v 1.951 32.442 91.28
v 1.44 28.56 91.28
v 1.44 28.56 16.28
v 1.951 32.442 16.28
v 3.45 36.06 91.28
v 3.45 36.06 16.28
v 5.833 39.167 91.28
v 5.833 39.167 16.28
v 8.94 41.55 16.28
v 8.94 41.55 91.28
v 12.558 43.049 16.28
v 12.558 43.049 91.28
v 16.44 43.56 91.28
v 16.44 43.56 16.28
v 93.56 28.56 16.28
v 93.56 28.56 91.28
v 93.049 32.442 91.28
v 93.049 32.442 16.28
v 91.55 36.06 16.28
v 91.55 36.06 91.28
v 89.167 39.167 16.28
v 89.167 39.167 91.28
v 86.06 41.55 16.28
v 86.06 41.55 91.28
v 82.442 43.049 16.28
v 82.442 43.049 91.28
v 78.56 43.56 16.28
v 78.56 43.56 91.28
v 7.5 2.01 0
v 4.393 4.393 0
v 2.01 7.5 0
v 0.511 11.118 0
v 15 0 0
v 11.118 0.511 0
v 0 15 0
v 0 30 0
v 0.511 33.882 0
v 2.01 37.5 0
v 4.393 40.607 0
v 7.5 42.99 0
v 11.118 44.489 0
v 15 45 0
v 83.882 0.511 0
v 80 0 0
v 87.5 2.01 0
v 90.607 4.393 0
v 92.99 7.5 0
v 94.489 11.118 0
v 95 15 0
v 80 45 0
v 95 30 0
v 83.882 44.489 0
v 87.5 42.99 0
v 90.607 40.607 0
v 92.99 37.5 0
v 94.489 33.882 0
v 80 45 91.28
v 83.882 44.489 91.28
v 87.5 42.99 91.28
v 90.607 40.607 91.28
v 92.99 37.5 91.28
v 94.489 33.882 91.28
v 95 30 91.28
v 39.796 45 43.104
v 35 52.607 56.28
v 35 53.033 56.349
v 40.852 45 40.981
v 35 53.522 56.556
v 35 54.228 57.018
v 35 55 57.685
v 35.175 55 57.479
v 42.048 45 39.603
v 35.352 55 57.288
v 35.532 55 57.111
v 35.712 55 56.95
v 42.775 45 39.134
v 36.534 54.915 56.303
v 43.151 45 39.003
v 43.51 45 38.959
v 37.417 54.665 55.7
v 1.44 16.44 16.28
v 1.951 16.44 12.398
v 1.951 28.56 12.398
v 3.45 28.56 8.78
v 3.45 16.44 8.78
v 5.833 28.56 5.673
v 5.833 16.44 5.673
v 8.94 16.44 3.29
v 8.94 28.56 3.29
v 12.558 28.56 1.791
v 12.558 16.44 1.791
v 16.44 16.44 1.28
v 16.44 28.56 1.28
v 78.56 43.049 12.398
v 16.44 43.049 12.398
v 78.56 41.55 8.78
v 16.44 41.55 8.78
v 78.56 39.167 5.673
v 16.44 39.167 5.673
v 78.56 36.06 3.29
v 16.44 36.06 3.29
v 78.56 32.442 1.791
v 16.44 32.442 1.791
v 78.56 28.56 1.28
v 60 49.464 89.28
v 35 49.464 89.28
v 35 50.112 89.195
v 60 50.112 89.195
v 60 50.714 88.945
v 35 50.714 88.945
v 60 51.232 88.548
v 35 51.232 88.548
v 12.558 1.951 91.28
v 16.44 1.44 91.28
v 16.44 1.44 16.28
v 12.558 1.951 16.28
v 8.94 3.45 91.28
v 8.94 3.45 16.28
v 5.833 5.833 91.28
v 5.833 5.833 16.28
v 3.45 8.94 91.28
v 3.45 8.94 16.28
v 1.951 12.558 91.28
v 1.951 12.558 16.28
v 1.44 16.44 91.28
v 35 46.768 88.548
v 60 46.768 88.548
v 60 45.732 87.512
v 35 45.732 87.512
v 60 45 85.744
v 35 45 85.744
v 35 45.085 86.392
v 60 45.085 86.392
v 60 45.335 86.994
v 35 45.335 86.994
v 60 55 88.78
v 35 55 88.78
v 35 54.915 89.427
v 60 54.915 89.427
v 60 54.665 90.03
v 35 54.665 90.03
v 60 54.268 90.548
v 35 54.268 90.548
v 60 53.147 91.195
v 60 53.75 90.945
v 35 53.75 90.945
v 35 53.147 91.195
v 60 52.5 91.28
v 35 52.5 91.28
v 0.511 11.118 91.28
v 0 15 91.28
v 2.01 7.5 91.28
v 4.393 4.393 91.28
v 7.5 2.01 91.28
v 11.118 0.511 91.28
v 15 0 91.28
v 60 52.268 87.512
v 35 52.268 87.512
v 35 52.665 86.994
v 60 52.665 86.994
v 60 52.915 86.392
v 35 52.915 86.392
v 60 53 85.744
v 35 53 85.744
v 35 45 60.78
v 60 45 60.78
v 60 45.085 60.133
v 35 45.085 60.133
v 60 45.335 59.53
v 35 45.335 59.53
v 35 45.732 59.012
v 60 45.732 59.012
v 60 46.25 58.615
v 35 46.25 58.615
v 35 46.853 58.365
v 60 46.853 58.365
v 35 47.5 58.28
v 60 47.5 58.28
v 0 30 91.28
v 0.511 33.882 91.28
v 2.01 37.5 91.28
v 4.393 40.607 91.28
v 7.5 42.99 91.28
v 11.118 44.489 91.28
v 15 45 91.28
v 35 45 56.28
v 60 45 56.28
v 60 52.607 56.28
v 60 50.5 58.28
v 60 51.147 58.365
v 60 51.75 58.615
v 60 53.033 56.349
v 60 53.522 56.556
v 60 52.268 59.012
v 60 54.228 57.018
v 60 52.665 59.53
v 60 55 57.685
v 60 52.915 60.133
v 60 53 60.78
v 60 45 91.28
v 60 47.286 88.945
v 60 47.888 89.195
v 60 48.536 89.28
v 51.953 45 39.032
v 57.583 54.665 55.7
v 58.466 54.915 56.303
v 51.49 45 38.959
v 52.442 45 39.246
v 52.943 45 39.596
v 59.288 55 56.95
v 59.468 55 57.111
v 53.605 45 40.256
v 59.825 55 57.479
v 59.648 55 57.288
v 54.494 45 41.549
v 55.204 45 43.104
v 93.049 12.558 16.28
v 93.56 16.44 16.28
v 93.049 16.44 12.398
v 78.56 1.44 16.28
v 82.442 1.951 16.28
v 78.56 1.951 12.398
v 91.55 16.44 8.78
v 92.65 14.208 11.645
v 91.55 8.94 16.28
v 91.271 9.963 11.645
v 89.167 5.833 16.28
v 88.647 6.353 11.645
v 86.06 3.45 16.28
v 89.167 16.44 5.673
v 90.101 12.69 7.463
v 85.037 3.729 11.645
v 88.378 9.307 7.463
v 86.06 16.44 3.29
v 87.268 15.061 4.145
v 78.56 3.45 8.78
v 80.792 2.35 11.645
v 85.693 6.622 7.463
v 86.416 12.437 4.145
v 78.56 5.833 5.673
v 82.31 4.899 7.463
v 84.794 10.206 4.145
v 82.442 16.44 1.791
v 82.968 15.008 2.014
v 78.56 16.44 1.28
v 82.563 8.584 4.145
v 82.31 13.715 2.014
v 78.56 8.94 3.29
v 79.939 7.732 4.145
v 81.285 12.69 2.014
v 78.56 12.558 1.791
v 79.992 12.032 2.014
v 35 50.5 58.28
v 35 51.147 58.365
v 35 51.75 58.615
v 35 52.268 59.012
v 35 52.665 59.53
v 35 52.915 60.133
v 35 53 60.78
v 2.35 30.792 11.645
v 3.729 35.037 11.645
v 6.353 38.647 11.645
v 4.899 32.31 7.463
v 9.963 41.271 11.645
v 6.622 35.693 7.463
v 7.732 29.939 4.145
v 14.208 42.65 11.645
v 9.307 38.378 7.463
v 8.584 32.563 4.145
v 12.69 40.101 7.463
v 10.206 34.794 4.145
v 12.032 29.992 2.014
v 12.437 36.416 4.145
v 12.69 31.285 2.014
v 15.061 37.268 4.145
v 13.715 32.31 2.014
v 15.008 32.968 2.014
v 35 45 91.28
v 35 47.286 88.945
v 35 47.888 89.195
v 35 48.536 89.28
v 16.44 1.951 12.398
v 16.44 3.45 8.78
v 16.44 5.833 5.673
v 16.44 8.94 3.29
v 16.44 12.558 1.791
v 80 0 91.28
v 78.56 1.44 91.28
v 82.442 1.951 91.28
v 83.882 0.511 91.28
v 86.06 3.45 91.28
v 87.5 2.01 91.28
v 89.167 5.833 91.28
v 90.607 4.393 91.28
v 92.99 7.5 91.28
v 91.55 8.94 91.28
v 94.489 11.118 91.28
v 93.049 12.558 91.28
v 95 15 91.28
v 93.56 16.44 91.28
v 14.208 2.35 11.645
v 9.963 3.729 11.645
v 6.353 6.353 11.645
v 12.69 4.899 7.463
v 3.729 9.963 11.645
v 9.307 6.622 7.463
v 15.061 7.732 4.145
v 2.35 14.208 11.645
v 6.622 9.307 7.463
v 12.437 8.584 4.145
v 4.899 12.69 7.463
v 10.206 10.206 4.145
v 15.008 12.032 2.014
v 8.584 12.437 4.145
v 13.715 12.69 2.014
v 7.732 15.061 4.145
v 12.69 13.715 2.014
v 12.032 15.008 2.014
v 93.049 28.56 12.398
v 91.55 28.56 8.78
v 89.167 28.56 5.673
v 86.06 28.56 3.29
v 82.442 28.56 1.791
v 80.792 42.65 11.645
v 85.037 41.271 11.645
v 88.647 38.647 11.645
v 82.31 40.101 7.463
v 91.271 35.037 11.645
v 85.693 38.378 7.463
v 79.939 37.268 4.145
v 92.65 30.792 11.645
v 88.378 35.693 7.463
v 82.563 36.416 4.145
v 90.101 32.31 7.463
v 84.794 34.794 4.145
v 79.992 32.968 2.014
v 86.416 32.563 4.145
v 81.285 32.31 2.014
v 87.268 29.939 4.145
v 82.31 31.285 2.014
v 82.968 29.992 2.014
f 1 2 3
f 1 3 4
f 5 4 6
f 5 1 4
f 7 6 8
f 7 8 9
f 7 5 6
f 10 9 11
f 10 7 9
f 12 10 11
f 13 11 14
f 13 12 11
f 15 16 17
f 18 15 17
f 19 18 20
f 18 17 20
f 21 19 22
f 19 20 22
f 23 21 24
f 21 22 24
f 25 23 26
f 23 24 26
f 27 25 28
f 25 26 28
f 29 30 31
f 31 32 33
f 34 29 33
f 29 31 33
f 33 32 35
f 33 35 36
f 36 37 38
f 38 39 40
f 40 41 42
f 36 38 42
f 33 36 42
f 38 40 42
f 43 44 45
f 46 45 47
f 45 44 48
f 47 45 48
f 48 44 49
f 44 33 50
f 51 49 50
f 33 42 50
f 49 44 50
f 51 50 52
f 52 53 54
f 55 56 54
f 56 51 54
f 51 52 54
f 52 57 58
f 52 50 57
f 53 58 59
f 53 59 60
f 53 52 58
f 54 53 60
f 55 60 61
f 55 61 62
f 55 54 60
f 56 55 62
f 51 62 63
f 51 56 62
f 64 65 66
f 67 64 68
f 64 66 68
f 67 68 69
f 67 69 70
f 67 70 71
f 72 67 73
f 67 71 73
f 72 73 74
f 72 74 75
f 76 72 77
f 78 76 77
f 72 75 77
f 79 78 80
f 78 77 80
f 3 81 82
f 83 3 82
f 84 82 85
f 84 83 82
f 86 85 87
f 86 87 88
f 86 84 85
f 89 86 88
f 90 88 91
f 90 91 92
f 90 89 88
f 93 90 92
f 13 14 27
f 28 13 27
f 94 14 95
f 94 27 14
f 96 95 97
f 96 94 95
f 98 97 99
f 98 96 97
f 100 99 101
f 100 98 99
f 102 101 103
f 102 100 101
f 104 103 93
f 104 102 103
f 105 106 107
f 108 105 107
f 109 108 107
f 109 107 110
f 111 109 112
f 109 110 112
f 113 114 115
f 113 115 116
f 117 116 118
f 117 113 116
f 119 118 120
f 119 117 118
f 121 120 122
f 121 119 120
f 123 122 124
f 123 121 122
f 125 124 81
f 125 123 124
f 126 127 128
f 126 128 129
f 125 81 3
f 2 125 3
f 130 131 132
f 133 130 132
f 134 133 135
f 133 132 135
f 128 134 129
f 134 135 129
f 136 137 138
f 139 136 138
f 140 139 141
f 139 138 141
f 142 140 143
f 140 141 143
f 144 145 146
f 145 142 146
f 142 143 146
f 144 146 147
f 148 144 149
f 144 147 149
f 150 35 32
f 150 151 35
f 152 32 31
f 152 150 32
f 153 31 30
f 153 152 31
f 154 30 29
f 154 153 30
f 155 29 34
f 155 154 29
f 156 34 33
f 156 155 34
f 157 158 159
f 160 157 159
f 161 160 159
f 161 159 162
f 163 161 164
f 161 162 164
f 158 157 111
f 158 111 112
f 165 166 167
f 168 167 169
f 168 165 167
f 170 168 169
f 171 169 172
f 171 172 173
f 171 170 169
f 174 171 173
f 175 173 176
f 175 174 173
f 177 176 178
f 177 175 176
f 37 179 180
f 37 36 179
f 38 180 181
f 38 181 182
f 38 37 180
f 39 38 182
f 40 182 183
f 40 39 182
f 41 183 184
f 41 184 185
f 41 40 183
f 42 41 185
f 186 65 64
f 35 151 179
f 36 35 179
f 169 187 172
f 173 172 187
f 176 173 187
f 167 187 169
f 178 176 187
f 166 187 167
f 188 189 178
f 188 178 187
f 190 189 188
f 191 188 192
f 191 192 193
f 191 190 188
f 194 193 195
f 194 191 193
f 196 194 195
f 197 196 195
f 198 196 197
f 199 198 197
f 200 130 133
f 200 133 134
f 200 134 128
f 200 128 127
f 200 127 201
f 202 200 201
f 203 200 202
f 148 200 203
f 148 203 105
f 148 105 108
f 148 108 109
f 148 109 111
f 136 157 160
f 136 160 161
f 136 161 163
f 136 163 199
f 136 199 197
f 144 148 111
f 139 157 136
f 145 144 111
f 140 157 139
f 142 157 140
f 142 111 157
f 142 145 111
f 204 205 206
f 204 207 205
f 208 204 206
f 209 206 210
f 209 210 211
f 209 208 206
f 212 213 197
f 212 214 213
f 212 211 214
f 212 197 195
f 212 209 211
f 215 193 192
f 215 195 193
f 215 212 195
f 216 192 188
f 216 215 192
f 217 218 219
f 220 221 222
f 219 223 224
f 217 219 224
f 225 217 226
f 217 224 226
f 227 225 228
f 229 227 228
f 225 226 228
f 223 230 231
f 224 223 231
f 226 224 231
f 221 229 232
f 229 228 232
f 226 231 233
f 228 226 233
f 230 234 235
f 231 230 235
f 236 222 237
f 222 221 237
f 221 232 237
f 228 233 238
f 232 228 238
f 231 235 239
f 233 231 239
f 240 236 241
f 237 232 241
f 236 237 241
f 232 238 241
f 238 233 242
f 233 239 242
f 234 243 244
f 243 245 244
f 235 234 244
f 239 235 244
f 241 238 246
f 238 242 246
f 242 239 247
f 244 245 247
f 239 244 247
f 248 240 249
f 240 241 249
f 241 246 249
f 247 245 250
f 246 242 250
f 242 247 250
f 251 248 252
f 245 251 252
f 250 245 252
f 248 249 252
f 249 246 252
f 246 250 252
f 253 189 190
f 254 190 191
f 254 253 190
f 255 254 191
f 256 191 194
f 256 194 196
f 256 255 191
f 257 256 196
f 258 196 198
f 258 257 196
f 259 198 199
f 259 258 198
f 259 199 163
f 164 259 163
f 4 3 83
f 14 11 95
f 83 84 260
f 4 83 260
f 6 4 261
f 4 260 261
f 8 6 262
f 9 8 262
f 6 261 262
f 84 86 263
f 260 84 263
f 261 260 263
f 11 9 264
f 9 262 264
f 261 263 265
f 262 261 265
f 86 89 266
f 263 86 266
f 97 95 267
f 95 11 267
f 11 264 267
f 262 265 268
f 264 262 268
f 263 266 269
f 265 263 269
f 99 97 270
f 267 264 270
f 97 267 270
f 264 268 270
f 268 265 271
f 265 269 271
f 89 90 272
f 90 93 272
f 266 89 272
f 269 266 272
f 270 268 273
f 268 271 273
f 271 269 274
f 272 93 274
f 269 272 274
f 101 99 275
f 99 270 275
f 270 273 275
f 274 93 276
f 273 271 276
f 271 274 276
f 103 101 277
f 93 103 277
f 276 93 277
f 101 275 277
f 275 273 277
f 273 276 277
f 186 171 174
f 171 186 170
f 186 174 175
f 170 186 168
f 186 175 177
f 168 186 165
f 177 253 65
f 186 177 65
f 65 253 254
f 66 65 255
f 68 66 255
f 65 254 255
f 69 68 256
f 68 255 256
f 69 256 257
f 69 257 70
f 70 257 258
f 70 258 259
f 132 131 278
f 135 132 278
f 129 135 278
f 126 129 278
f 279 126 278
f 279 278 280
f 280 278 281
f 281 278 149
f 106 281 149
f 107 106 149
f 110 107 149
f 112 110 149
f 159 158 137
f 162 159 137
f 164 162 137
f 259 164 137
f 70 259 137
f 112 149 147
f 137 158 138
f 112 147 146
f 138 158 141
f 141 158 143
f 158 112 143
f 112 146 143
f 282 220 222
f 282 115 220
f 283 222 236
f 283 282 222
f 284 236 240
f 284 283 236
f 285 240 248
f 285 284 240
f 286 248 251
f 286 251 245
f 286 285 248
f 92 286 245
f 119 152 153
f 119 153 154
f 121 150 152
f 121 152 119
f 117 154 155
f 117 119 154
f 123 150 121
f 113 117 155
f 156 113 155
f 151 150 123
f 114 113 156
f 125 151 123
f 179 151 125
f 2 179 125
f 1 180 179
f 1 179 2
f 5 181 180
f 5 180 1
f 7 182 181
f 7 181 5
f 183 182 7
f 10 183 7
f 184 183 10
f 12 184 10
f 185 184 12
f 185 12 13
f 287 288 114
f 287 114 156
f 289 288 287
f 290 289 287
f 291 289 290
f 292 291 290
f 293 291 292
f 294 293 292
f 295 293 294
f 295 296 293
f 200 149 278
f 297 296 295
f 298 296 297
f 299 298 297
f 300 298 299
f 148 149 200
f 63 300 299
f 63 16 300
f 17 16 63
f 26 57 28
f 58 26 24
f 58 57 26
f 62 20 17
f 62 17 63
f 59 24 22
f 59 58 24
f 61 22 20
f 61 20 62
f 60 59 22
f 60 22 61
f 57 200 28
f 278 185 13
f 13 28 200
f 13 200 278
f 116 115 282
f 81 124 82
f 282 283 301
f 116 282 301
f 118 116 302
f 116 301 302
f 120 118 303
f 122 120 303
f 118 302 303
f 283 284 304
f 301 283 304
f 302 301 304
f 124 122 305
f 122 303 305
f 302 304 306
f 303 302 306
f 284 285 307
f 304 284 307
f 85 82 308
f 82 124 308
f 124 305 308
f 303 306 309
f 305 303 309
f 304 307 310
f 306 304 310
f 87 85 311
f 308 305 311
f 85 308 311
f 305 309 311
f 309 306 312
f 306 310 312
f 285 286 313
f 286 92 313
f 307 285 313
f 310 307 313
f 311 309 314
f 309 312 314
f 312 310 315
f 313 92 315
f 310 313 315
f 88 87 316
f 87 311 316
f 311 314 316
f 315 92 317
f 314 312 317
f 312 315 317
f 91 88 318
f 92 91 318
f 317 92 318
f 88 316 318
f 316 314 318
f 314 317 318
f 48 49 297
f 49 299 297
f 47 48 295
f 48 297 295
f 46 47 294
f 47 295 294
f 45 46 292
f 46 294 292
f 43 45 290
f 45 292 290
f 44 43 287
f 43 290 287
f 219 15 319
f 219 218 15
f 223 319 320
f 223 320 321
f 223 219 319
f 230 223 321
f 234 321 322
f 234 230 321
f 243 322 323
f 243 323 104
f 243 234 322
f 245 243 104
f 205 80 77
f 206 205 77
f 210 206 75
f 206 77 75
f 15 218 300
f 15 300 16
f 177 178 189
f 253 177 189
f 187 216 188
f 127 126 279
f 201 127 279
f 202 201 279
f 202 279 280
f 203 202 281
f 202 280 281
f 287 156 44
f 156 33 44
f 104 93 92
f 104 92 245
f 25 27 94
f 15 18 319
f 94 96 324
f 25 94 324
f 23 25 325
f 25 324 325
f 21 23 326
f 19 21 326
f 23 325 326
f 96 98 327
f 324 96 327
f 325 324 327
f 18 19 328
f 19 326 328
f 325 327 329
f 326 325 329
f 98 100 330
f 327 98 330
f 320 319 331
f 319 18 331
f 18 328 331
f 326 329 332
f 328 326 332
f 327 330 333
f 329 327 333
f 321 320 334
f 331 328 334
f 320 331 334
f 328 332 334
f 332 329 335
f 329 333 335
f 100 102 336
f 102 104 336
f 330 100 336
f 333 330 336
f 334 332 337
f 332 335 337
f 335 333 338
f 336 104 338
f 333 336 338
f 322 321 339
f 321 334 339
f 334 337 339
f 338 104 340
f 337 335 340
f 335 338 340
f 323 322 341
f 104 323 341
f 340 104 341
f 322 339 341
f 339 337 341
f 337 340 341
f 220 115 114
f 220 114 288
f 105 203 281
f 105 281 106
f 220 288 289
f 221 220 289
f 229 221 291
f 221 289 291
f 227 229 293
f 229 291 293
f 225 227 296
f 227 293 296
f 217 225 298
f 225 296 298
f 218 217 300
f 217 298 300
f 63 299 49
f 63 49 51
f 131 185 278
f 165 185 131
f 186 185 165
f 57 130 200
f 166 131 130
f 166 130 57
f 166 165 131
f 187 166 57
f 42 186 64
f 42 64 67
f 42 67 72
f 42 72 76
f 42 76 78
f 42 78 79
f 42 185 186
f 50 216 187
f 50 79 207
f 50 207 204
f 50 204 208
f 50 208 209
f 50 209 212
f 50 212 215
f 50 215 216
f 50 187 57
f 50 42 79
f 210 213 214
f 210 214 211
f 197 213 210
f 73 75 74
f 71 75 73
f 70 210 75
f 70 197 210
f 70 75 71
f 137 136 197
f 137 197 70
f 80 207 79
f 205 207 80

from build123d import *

# Parameters (mm, degrees)
F0_W          = 95
F0_H          = 45
F1_DEPTH      = 1.28
F2_W          = 95
F2_H          = 45
F2_W_2        = 92.12
F2_H_2        = 42.12
F3_DEPTH      = 90
F4_W          = 25
F4_H          = 35
F5_DEPTH      = 10
F6_W          = 8
F6_H          = 31
F7_DEPTH      = 60.001
F9_DEPTH      = 25
F11_DEPTH     = 10
F12_SIZE      = 2.5
F13_T1_DEPTH  = 25
F13_T3_DEPTH  = 37.5
F13_T5_DEPTH  = 28.3493649054
F13_T10_DEPTH = 35.1683904211
F13_T15_DEPTH = 35.1683904211
F14_R         = 15
F15_R         = 15
F16_R         = 15


# Not quite as in the source:
# - a fillet or chamfer that OpenCascade refuses, or shapes differently, is made with other operations: its cross-section is extruded or revolved along the edge and cut away or added


with BuildPart() as f1:
    # F0 (on Top) → F1 (new body)
    with BuildSketch(Plane.XY):
        with Locations((47.5, 22.5)):
            Rectangle(F0_W, F0_H)
    extrude(amount=F1_DEPTH)

    # F2 (on face) → F3 (join)
    with BuildSketch(Plane.XY.offset(1.28)):
        with Locations((47.5, 22.5)):
            Rectangle(F2_W, F2_H)
        with Locations((47.5, 22.5)):
            Rectangle(F2_W_2, F2_H_2, mode=Mode.SUBTRACT)
    extrude(amount=F3_DEPTH)

    # F4 (on face) → F5 (join)
    with BuildSketch(Plane(origin=(0, 45, 0), x_dir=(-1, 0, 0), z_dir=(0, 1, 0))):
        with Locations((-47.5, 73.78)):
            Rectangle(F4_W, F4_H)
    extrude(amount=F5_DEPTH)

    # F6 (on face) → F7 (cut, through all)
    with BuildSketch(Plane.YZ.offset(60)):
        with Locations((49, 73.78)):
            Rectangle(F6_W, F6_H)
    extrude(amount=-F7_DEPTH, mode=Mode.SUBTRACT)

    # F8 (on face) → F9 (join, through all)
    with BuildSketch(Plane.YZ.offset(60)):
        Polygon((55, 56.28), (45, 56.28), (45, 38.9594919243), align=None)
    extrude(amount=-F9_DEPTH)

    # F10 (on face) → F11 (cut, through all)
    with BuildSketch(Plane(origin=(0, 55, 0), x_dir=(-1, 0, 0), z_dir=(0, 1, 0))):
        Polygon((-53.6958506181, 38.9594919243), (-60, 56.28), (-60, 38.9594919243), align=None)
        Polygon((-41.304149382, 38.9594919243), (-35, 38.9594919243), (-35, 56.28), align=None)
    extrude(amount=-F11_DEPTH, mode=Mode.SUBTRACT)

    # F12
    f12_edges = [f1.edges().sort_by_distance(p)[0] for p in [
        (47.5, 45, 89.28),
        (47.5, 53, 89.28),
    ]]
    chamfer(f12_edges, length=F12_SIZE)

    # F13: fillet of radius 2.5 on 10 edges, made by hand

    # F13_s2 → F13_t1 (join)
    with BuildSketch(Plane.YZ.offset(35)):
        with BuildLine():
            ThreePointArc((45, 85.7444660941), (45.1903011687, 86.701174675), (45.732233047, 87.512233047))
            Line((45.732233047, 87.512233047), (45, 86.78))
            Line((45, 86.78), (45, 85.7444660941))
        make_face()
        with BuildLine():
            ThreePointArc((52.267766953, 87.512233047), (52.8096988313, 86.701174675), (53, 85.7444660941))
            Line((53, 85.7444660941), (53, 86.78))
            Line((53, 86.78), (52.267766953, 87.512233047))
        make_face()
        with BuildLine():
            ThreePointArc((50.5, 58.28), (52.267766953, 59.012233047), (53, 60.78))
            Line((53, 60.78), (53, 58.28))
            Line((53, 58.28), (50.5, 58.28))
        make_face()
        with BuildLine():
            ThreePointArc((45, 60.78), (45.732233047, 59.012233047), (47.5, 58.28))
            Line((47.5, 58.28), (45, 58.28))
            Line((45, 58.28), (45, 60.78))
        make_face()
        with BuildLine():
            ThreePointArc((46.767766953, 88.547766953), (47.578825325, 89.0896988313), (48.5355339059, 89.28))
            Line((48.5355339059, 89.28), (47.5, 89.28))
            Line((47.5, 89.28), (46.767766953, 88.547766953))
        make_face()
        with BuildLine():
            ThreePointArc((49.4644660941, 89.28), (50.421174675, 89.0896988313), (51.232233047, 88.547766953))
            Line((51.232233047, 88.547766953), (50.5, 89.28))
            Line((50.5, 89.28), (49.4644660941, 89.28))
        make_face()
    extrude(amount=F13_T1_DEPTH)

    # F13_s4 → F13_t3 (cut)
    with BuildSketch(Plane.YZ.offset(28.75)):
        with BuildLine():
            ThreePointArc((55, 88.78), (54.267766953, 90.547766953), (52.5, 91.28))
            Line((52.5, 91.28), (55, 91.28))
            Line((55, 91.28), (55, 88.78))
        make_face()
    extrude(amount=F13_T3_DEPTH, mode=Mode.SUBTRACT)

    # F13_s6 → F13_t5 (cut)
    with BuildSketch(Plane.YZ.offset(33.3253175473)):
        with BuildLine():
            ThreePointArc((54.6650635095, 55.6998729811), (54.9148145657, 56.3028253683), (55, 56.9498729811))
            Line((55, 56.9498729811), (55, 56.28))
            Line((55, 56.28), (54.6650635095, 55.6998729811))
        make_face()
    extrude(amount=F13_T5_DEPTH, mode=Mode.SUBTRACT)


with BuildPart() as f13_tool8:
    # F13_s9 → F13_t10 (new body)
    with BuildSketch(Plane(origin=(19.397060828, 30.7687201759, 53.2929866286), x_dir=(-0.8459331757, 0.5332889107, 0), z_dir=(0.3006265785, 0.4768709627, 0.8259647361))):
        with BuildLine():
            ThreePointArc((-19.5594103687, -32.1600455029), (-21.2581254439, -32.3827100323), (-22.7013076364, -31.4594345813))
            Line((-22.7013076364, -31.4594345813), (-21.425100455, -33.1315112786))
            Line((-21.425100455, -33.1315112786), (-19.5594103687, -32.1600455029))
        make_face()
    extrude(amount=F13_T10_DEPTH)

    split(bisect_by=Plane.XZ.offset(-45), keep=Keep.BOTTOM)


with BuildPart() as f1_1:
    add(f1.part)

    # F13_t7: cut F13_tool8
    add(f13_tool8.part, mode=Mode.SUBTRACT)


with BuildPart() as f13_tool13:
    # F13_s14 → F13_t15 (new body)
    with BuildSketch(Plane(origin=(-21.3838614404, 33.9202962128, 58.7516764483), x_dir=(0.8459331757, 0.5332889107, 0), z_dir=(0.3006265785, -0.4768709627, -0.8259647361))):
        with BuildLine():
            ThreePointArc((57.6623440552, 10.3859596823), (59.1055262478, 9.4626842314), (60.8042413229, 9.6853487608))
            Line((60.8042413229, 9.6853487608), (58.9385512366, 8.713882985))
            Line((58.9385512366, 8.713882985), (57.6623440552, 10.3859596823))
        make_face()
    extrude(amount=F13_T15_DEPTH)

    split(bisect_by=Plane.XZ.offset(-45), keep=Keep.BOTTOM)


with BuildPart() as f1_2:
    add(f1_1.part)

    # F13_t12: cut F13_tool13
    add(f13_tool13.part, mode=Mode.SUBTRACT)

    # F14
    f14_edges = [f1_2.edges().sort_by_distance(p)[0] for p in [
        (1.44, 43.56, 46.28),
        (1.44, 1.44, 46.28),
        (93.56, 43.56, 46.28),
        (93.56, 1.44, 46.28),
    ]]
    fillet(f14_edges, radius=F14_R)

    # F15
    f15_edges = [f1_2.edges().sort_by_distance(p)[0] for p in [
        (95, 0, 45.64),
        (95, 45, 45.64),
        (0, 45, 45.64),
        (0, 0, 45.64),
    ]]
    fillet(f15_edges, radius=F15_R)

    # F16
    f16_edges = [f1_2.edges().sort_by_distance(p)[0] for p in [
        (47.5, 43.56, 1.28),
        (5.833398, 39.166602, 1.28),
        (89.166602, 39.166602, 1.28),
        (1.44, 22.5, 1.28),
        (93.56, 22.5, 1.28),
        (5.833398, 5.833398, 1.28),
        (89.166602, 5.833398, 1.28),
        (47.5, 1.44, 1.28),
    ]]
    fillet(f16_edges, radius=F16_R)


solid = f1_2.part
